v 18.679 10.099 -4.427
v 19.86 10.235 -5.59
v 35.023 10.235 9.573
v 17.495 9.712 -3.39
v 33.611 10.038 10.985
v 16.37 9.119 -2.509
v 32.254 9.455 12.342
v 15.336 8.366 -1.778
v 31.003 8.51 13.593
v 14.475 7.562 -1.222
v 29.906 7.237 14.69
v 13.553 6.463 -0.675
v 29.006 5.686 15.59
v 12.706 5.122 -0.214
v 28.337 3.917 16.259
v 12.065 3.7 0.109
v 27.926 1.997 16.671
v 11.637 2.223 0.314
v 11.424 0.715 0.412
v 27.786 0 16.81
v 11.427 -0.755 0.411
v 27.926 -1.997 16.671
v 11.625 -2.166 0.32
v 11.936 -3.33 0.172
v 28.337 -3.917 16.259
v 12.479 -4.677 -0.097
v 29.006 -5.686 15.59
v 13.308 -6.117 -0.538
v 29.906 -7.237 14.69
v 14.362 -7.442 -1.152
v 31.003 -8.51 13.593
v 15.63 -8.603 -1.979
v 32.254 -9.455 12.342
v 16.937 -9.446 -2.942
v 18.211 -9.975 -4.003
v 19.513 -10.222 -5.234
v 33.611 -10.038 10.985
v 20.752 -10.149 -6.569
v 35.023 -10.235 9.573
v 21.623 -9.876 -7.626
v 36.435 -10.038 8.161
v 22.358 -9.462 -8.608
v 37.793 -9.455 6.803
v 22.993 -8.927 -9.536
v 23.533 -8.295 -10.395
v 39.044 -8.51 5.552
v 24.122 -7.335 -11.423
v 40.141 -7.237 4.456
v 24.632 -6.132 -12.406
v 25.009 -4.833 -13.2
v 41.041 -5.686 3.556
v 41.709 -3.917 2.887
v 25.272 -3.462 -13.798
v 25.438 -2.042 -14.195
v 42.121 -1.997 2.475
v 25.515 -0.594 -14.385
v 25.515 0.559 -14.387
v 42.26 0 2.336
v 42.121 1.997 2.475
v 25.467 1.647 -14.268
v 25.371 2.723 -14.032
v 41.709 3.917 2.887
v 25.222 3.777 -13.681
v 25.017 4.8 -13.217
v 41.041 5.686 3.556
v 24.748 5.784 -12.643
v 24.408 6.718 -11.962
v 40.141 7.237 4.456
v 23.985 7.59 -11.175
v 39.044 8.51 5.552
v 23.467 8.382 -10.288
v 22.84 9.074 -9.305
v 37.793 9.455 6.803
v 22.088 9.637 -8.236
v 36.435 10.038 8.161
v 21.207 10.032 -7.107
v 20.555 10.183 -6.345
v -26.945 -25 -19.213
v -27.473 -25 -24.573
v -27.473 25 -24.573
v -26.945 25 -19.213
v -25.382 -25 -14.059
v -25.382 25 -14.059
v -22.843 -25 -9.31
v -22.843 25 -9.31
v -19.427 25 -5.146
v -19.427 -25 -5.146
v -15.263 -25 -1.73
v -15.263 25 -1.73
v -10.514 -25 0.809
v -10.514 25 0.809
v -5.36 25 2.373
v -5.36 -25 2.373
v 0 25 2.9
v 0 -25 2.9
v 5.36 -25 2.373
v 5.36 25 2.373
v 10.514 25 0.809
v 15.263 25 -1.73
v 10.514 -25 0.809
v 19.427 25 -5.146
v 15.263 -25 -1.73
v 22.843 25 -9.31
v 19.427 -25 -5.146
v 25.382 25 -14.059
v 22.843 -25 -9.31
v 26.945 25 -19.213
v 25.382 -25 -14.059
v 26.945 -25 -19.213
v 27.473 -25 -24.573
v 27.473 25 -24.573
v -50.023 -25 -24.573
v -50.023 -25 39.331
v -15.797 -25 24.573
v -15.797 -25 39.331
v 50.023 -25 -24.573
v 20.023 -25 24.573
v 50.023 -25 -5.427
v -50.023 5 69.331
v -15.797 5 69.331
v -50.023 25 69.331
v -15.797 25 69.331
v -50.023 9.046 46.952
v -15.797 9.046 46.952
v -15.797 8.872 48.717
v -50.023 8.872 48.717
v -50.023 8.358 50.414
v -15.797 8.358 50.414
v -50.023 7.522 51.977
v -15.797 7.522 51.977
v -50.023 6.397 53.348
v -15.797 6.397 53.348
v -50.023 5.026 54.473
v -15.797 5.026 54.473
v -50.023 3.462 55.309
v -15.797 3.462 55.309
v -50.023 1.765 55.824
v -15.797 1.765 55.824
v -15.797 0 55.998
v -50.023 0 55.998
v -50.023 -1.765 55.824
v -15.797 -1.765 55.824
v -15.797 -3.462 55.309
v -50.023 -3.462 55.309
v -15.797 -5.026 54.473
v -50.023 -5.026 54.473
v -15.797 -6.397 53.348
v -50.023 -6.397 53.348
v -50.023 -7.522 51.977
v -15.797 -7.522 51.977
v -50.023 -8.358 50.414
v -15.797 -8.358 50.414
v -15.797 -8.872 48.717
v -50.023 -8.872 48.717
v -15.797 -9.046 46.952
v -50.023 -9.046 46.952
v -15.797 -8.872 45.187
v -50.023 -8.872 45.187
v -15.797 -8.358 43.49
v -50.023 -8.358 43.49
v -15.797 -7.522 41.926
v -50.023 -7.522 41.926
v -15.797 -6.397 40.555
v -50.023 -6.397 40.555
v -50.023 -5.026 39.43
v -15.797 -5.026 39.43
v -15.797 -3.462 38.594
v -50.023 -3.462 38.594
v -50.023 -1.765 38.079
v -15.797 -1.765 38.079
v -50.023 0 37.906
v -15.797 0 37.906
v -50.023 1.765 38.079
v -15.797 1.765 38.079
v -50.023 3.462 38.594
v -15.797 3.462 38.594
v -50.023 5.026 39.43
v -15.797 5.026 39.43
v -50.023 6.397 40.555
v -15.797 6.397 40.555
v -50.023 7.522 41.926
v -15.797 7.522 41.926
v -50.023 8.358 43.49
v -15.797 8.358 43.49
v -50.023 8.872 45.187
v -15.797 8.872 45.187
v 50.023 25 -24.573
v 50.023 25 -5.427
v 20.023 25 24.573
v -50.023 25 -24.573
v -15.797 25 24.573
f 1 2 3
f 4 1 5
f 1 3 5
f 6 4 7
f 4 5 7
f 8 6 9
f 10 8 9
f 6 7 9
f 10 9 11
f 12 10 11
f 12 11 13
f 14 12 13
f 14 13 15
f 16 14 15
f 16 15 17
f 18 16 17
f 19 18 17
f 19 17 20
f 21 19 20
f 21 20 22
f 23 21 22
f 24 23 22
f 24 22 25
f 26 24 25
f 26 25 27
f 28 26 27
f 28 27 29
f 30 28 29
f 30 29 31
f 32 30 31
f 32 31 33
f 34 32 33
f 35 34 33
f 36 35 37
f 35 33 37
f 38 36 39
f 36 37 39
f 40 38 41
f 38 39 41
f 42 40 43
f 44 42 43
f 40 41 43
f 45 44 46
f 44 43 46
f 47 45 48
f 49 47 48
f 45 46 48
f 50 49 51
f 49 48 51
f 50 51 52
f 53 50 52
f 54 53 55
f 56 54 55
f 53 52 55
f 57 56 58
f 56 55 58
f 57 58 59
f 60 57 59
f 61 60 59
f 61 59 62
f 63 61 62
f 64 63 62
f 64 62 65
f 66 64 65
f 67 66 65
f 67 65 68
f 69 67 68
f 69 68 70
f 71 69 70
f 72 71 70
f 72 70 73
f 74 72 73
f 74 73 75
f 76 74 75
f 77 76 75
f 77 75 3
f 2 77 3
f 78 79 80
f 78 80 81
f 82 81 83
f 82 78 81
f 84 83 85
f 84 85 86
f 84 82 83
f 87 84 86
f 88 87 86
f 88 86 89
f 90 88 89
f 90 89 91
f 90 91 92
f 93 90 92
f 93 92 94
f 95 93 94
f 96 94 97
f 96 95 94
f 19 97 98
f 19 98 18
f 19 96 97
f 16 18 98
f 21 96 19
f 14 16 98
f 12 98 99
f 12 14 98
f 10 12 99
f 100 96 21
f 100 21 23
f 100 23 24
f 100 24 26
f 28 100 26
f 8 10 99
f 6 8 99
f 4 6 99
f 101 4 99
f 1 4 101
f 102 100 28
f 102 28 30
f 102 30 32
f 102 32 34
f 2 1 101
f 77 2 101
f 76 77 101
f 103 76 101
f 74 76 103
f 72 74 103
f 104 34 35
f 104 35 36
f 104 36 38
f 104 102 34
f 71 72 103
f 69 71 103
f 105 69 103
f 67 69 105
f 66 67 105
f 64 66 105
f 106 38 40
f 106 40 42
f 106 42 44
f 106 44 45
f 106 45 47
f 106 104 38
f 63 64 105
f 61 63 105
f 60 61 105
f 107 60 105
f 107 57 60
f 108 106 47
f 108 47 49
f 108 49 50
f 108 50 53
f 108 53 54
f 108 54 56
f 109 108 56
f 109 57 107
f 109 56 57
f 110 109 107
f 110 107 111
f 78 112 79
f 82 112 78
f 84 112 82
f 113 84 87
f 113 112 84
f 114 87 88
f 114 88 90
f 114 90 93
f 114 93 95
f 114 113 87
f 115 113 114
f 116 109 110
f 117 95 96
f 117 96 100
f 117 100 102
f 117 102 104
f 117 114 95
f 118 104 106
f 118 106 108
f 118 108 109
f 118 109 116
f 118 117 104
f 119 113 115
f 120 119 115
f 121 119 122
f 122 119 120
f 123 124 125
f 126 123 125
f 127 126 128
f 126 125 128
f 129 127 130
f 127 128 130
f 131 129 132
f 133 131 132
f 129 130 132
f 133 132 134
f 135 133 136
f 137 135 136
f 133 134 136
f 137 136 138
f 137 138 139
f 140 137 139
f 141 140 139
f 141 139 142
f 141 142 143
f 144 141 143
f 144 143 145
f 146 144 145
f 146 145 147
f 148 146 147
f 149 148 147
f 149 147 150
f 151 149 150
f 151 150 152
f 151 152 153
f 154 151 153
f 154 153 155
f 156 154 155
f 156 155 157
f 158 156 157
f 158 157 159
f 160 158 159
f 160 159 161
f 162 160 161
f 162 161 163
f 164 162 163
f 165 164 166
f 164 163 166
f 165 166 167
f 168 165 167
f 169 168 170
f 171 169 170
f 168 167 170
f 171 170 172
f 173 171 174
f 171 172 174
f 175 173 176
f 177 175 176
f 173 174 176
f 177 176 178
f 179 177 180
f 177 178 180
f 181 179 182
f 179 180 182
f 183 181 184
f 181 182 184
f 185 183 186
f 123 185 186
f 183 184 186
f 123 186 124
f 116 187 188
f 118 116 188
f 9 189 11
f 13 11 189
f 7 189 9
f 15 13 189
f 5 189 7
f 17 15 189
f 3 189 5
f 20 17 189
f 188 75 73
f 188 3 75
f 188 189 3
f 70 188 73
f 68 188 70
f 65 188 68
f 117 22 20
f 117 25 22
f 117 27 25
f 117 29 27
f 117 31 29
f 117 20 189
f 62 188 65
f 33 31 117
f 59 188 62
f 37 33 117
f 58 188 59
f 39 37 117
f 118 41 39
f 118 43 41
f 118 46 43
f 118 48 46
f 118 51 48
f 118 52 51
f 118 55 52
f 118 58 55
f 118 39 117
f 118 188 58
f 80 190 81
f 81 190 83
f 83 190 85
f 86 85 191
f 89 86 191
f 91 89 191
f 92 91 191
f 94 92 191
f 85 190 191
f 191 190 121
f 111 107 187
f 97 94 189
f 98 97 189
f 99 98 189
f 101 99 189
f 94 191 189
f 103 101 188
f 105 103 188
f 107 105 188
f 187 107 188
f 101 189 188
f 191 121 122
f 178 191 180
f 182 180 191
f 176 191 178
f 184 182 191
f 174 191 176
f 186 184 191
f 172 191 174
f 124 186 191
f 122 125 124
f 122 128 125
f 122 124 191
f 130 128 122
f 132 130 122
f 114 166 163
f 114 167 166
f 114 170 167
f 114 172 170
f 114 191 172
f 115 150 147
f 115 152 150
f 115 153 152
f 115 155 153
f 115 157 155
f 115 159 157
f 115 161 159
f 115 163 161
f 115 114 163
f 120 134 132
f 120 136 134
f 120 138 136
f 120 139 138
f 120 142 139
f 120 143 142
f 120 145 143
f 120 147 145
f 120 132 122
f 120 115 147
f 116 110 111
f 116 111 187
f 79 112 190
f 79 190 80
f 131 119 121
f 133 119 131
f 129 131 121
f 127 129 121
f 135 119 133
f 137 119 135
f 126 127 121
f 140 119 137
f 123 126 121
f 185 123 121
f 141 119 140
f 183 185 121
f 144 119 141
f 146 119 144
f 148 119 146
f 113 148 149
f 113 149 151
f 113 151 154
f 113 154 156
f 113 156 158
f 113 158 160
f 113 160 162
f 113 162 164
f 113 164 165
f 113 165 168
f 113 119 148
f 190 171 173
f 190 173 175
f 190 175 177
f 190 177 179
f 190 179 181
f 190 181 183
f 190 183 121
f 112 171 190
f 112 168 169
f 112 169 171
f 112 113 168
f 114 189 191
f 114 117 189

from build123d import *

# Parameters (mm, degrees)
F0_W     = 34.2265013605
F0_H     = 44.7577312589
F1_DEPTH = 25
F2_SIZE  = 30
F3_SIZE  = 30
F4_R     = 9.0461228016
F5_DEPTH = 34.2275013605
F6_R     = 10.2345227576
F7_DEPTH = 84.2827808433


with BuildPart() as f1:
    # F0 (on Front) → F1 (new body, symmetric)
    with BuildSketch(Plane.XZ):
        with Locations((-32.9100964591, 46.9517372549)):
            Rectangle(F0_W, F0_H)
        with BuildLine():
            Line((-15.7968457788, 24.5728716254), (-50.0233471394, 24.5728716254))
            Line((-50.0233471394, 24.5728716254), (-50.0233471394, -24.5728716254))
            Line((-50.0233471394, -24.5728716254), (-27.4733056784, -24.5728716254))
            ThreePointArc((-27.4733056784, -24.5728716254), (0, 2.900434053), (27.4733056784, -24.5728716254))
            Line((27.4733056784, -24.5728716254), (50.0233471394, -24.5728716254))
            Line((50.0233471394, -24.5728716254), (50.0233471394, 24.5728716254))
            Line((50.0233471394, 24.5728716254), (-15.7968457788, 24.5728716254))
        make_face()
    extrude(amount=F1_DEPTH, both=True)

    # F2
    f2_edges = [f1.edges().sort_by_distance(p)[0] for p in [
        (-32.910096, -25, 69.330603),
    ]]
    chamfer(f2_edges, length=F2_SIZE)

    # F3
    f3_edges = [f1.edges().sort_by_distance(p)[0] for p in [
        (50.023347, 0, 24.572872),
    ]]
    chamfer(f3_edges, length=F3_SIZE)

    # F4 (on face) → F5 (cut, through all)
    with BuildSketch(Plane.YZ.offset(-15.7968457788)):
        with Locations((0, 46.9517372549)):
            Circle(F4_R)
    extrude(amount=-F5_DEPTH, mode=Mode.SUBTRACT)

    # F6 (on face) → F7 (cut, through all)
    with BuildSketch(Plane(origin=(22.2981093824, 0, 22.2981093824), x_dir=(0, 1, 0), z_dir=(0.7071067812, 0, 0.7071067812))):
        with Locations((0, -17.9962038203)):
            Circle(F6_R)
    extrude(amount=-F7_DEPTH, mode=Mode.SUBTRACT)


solid = f1.part
